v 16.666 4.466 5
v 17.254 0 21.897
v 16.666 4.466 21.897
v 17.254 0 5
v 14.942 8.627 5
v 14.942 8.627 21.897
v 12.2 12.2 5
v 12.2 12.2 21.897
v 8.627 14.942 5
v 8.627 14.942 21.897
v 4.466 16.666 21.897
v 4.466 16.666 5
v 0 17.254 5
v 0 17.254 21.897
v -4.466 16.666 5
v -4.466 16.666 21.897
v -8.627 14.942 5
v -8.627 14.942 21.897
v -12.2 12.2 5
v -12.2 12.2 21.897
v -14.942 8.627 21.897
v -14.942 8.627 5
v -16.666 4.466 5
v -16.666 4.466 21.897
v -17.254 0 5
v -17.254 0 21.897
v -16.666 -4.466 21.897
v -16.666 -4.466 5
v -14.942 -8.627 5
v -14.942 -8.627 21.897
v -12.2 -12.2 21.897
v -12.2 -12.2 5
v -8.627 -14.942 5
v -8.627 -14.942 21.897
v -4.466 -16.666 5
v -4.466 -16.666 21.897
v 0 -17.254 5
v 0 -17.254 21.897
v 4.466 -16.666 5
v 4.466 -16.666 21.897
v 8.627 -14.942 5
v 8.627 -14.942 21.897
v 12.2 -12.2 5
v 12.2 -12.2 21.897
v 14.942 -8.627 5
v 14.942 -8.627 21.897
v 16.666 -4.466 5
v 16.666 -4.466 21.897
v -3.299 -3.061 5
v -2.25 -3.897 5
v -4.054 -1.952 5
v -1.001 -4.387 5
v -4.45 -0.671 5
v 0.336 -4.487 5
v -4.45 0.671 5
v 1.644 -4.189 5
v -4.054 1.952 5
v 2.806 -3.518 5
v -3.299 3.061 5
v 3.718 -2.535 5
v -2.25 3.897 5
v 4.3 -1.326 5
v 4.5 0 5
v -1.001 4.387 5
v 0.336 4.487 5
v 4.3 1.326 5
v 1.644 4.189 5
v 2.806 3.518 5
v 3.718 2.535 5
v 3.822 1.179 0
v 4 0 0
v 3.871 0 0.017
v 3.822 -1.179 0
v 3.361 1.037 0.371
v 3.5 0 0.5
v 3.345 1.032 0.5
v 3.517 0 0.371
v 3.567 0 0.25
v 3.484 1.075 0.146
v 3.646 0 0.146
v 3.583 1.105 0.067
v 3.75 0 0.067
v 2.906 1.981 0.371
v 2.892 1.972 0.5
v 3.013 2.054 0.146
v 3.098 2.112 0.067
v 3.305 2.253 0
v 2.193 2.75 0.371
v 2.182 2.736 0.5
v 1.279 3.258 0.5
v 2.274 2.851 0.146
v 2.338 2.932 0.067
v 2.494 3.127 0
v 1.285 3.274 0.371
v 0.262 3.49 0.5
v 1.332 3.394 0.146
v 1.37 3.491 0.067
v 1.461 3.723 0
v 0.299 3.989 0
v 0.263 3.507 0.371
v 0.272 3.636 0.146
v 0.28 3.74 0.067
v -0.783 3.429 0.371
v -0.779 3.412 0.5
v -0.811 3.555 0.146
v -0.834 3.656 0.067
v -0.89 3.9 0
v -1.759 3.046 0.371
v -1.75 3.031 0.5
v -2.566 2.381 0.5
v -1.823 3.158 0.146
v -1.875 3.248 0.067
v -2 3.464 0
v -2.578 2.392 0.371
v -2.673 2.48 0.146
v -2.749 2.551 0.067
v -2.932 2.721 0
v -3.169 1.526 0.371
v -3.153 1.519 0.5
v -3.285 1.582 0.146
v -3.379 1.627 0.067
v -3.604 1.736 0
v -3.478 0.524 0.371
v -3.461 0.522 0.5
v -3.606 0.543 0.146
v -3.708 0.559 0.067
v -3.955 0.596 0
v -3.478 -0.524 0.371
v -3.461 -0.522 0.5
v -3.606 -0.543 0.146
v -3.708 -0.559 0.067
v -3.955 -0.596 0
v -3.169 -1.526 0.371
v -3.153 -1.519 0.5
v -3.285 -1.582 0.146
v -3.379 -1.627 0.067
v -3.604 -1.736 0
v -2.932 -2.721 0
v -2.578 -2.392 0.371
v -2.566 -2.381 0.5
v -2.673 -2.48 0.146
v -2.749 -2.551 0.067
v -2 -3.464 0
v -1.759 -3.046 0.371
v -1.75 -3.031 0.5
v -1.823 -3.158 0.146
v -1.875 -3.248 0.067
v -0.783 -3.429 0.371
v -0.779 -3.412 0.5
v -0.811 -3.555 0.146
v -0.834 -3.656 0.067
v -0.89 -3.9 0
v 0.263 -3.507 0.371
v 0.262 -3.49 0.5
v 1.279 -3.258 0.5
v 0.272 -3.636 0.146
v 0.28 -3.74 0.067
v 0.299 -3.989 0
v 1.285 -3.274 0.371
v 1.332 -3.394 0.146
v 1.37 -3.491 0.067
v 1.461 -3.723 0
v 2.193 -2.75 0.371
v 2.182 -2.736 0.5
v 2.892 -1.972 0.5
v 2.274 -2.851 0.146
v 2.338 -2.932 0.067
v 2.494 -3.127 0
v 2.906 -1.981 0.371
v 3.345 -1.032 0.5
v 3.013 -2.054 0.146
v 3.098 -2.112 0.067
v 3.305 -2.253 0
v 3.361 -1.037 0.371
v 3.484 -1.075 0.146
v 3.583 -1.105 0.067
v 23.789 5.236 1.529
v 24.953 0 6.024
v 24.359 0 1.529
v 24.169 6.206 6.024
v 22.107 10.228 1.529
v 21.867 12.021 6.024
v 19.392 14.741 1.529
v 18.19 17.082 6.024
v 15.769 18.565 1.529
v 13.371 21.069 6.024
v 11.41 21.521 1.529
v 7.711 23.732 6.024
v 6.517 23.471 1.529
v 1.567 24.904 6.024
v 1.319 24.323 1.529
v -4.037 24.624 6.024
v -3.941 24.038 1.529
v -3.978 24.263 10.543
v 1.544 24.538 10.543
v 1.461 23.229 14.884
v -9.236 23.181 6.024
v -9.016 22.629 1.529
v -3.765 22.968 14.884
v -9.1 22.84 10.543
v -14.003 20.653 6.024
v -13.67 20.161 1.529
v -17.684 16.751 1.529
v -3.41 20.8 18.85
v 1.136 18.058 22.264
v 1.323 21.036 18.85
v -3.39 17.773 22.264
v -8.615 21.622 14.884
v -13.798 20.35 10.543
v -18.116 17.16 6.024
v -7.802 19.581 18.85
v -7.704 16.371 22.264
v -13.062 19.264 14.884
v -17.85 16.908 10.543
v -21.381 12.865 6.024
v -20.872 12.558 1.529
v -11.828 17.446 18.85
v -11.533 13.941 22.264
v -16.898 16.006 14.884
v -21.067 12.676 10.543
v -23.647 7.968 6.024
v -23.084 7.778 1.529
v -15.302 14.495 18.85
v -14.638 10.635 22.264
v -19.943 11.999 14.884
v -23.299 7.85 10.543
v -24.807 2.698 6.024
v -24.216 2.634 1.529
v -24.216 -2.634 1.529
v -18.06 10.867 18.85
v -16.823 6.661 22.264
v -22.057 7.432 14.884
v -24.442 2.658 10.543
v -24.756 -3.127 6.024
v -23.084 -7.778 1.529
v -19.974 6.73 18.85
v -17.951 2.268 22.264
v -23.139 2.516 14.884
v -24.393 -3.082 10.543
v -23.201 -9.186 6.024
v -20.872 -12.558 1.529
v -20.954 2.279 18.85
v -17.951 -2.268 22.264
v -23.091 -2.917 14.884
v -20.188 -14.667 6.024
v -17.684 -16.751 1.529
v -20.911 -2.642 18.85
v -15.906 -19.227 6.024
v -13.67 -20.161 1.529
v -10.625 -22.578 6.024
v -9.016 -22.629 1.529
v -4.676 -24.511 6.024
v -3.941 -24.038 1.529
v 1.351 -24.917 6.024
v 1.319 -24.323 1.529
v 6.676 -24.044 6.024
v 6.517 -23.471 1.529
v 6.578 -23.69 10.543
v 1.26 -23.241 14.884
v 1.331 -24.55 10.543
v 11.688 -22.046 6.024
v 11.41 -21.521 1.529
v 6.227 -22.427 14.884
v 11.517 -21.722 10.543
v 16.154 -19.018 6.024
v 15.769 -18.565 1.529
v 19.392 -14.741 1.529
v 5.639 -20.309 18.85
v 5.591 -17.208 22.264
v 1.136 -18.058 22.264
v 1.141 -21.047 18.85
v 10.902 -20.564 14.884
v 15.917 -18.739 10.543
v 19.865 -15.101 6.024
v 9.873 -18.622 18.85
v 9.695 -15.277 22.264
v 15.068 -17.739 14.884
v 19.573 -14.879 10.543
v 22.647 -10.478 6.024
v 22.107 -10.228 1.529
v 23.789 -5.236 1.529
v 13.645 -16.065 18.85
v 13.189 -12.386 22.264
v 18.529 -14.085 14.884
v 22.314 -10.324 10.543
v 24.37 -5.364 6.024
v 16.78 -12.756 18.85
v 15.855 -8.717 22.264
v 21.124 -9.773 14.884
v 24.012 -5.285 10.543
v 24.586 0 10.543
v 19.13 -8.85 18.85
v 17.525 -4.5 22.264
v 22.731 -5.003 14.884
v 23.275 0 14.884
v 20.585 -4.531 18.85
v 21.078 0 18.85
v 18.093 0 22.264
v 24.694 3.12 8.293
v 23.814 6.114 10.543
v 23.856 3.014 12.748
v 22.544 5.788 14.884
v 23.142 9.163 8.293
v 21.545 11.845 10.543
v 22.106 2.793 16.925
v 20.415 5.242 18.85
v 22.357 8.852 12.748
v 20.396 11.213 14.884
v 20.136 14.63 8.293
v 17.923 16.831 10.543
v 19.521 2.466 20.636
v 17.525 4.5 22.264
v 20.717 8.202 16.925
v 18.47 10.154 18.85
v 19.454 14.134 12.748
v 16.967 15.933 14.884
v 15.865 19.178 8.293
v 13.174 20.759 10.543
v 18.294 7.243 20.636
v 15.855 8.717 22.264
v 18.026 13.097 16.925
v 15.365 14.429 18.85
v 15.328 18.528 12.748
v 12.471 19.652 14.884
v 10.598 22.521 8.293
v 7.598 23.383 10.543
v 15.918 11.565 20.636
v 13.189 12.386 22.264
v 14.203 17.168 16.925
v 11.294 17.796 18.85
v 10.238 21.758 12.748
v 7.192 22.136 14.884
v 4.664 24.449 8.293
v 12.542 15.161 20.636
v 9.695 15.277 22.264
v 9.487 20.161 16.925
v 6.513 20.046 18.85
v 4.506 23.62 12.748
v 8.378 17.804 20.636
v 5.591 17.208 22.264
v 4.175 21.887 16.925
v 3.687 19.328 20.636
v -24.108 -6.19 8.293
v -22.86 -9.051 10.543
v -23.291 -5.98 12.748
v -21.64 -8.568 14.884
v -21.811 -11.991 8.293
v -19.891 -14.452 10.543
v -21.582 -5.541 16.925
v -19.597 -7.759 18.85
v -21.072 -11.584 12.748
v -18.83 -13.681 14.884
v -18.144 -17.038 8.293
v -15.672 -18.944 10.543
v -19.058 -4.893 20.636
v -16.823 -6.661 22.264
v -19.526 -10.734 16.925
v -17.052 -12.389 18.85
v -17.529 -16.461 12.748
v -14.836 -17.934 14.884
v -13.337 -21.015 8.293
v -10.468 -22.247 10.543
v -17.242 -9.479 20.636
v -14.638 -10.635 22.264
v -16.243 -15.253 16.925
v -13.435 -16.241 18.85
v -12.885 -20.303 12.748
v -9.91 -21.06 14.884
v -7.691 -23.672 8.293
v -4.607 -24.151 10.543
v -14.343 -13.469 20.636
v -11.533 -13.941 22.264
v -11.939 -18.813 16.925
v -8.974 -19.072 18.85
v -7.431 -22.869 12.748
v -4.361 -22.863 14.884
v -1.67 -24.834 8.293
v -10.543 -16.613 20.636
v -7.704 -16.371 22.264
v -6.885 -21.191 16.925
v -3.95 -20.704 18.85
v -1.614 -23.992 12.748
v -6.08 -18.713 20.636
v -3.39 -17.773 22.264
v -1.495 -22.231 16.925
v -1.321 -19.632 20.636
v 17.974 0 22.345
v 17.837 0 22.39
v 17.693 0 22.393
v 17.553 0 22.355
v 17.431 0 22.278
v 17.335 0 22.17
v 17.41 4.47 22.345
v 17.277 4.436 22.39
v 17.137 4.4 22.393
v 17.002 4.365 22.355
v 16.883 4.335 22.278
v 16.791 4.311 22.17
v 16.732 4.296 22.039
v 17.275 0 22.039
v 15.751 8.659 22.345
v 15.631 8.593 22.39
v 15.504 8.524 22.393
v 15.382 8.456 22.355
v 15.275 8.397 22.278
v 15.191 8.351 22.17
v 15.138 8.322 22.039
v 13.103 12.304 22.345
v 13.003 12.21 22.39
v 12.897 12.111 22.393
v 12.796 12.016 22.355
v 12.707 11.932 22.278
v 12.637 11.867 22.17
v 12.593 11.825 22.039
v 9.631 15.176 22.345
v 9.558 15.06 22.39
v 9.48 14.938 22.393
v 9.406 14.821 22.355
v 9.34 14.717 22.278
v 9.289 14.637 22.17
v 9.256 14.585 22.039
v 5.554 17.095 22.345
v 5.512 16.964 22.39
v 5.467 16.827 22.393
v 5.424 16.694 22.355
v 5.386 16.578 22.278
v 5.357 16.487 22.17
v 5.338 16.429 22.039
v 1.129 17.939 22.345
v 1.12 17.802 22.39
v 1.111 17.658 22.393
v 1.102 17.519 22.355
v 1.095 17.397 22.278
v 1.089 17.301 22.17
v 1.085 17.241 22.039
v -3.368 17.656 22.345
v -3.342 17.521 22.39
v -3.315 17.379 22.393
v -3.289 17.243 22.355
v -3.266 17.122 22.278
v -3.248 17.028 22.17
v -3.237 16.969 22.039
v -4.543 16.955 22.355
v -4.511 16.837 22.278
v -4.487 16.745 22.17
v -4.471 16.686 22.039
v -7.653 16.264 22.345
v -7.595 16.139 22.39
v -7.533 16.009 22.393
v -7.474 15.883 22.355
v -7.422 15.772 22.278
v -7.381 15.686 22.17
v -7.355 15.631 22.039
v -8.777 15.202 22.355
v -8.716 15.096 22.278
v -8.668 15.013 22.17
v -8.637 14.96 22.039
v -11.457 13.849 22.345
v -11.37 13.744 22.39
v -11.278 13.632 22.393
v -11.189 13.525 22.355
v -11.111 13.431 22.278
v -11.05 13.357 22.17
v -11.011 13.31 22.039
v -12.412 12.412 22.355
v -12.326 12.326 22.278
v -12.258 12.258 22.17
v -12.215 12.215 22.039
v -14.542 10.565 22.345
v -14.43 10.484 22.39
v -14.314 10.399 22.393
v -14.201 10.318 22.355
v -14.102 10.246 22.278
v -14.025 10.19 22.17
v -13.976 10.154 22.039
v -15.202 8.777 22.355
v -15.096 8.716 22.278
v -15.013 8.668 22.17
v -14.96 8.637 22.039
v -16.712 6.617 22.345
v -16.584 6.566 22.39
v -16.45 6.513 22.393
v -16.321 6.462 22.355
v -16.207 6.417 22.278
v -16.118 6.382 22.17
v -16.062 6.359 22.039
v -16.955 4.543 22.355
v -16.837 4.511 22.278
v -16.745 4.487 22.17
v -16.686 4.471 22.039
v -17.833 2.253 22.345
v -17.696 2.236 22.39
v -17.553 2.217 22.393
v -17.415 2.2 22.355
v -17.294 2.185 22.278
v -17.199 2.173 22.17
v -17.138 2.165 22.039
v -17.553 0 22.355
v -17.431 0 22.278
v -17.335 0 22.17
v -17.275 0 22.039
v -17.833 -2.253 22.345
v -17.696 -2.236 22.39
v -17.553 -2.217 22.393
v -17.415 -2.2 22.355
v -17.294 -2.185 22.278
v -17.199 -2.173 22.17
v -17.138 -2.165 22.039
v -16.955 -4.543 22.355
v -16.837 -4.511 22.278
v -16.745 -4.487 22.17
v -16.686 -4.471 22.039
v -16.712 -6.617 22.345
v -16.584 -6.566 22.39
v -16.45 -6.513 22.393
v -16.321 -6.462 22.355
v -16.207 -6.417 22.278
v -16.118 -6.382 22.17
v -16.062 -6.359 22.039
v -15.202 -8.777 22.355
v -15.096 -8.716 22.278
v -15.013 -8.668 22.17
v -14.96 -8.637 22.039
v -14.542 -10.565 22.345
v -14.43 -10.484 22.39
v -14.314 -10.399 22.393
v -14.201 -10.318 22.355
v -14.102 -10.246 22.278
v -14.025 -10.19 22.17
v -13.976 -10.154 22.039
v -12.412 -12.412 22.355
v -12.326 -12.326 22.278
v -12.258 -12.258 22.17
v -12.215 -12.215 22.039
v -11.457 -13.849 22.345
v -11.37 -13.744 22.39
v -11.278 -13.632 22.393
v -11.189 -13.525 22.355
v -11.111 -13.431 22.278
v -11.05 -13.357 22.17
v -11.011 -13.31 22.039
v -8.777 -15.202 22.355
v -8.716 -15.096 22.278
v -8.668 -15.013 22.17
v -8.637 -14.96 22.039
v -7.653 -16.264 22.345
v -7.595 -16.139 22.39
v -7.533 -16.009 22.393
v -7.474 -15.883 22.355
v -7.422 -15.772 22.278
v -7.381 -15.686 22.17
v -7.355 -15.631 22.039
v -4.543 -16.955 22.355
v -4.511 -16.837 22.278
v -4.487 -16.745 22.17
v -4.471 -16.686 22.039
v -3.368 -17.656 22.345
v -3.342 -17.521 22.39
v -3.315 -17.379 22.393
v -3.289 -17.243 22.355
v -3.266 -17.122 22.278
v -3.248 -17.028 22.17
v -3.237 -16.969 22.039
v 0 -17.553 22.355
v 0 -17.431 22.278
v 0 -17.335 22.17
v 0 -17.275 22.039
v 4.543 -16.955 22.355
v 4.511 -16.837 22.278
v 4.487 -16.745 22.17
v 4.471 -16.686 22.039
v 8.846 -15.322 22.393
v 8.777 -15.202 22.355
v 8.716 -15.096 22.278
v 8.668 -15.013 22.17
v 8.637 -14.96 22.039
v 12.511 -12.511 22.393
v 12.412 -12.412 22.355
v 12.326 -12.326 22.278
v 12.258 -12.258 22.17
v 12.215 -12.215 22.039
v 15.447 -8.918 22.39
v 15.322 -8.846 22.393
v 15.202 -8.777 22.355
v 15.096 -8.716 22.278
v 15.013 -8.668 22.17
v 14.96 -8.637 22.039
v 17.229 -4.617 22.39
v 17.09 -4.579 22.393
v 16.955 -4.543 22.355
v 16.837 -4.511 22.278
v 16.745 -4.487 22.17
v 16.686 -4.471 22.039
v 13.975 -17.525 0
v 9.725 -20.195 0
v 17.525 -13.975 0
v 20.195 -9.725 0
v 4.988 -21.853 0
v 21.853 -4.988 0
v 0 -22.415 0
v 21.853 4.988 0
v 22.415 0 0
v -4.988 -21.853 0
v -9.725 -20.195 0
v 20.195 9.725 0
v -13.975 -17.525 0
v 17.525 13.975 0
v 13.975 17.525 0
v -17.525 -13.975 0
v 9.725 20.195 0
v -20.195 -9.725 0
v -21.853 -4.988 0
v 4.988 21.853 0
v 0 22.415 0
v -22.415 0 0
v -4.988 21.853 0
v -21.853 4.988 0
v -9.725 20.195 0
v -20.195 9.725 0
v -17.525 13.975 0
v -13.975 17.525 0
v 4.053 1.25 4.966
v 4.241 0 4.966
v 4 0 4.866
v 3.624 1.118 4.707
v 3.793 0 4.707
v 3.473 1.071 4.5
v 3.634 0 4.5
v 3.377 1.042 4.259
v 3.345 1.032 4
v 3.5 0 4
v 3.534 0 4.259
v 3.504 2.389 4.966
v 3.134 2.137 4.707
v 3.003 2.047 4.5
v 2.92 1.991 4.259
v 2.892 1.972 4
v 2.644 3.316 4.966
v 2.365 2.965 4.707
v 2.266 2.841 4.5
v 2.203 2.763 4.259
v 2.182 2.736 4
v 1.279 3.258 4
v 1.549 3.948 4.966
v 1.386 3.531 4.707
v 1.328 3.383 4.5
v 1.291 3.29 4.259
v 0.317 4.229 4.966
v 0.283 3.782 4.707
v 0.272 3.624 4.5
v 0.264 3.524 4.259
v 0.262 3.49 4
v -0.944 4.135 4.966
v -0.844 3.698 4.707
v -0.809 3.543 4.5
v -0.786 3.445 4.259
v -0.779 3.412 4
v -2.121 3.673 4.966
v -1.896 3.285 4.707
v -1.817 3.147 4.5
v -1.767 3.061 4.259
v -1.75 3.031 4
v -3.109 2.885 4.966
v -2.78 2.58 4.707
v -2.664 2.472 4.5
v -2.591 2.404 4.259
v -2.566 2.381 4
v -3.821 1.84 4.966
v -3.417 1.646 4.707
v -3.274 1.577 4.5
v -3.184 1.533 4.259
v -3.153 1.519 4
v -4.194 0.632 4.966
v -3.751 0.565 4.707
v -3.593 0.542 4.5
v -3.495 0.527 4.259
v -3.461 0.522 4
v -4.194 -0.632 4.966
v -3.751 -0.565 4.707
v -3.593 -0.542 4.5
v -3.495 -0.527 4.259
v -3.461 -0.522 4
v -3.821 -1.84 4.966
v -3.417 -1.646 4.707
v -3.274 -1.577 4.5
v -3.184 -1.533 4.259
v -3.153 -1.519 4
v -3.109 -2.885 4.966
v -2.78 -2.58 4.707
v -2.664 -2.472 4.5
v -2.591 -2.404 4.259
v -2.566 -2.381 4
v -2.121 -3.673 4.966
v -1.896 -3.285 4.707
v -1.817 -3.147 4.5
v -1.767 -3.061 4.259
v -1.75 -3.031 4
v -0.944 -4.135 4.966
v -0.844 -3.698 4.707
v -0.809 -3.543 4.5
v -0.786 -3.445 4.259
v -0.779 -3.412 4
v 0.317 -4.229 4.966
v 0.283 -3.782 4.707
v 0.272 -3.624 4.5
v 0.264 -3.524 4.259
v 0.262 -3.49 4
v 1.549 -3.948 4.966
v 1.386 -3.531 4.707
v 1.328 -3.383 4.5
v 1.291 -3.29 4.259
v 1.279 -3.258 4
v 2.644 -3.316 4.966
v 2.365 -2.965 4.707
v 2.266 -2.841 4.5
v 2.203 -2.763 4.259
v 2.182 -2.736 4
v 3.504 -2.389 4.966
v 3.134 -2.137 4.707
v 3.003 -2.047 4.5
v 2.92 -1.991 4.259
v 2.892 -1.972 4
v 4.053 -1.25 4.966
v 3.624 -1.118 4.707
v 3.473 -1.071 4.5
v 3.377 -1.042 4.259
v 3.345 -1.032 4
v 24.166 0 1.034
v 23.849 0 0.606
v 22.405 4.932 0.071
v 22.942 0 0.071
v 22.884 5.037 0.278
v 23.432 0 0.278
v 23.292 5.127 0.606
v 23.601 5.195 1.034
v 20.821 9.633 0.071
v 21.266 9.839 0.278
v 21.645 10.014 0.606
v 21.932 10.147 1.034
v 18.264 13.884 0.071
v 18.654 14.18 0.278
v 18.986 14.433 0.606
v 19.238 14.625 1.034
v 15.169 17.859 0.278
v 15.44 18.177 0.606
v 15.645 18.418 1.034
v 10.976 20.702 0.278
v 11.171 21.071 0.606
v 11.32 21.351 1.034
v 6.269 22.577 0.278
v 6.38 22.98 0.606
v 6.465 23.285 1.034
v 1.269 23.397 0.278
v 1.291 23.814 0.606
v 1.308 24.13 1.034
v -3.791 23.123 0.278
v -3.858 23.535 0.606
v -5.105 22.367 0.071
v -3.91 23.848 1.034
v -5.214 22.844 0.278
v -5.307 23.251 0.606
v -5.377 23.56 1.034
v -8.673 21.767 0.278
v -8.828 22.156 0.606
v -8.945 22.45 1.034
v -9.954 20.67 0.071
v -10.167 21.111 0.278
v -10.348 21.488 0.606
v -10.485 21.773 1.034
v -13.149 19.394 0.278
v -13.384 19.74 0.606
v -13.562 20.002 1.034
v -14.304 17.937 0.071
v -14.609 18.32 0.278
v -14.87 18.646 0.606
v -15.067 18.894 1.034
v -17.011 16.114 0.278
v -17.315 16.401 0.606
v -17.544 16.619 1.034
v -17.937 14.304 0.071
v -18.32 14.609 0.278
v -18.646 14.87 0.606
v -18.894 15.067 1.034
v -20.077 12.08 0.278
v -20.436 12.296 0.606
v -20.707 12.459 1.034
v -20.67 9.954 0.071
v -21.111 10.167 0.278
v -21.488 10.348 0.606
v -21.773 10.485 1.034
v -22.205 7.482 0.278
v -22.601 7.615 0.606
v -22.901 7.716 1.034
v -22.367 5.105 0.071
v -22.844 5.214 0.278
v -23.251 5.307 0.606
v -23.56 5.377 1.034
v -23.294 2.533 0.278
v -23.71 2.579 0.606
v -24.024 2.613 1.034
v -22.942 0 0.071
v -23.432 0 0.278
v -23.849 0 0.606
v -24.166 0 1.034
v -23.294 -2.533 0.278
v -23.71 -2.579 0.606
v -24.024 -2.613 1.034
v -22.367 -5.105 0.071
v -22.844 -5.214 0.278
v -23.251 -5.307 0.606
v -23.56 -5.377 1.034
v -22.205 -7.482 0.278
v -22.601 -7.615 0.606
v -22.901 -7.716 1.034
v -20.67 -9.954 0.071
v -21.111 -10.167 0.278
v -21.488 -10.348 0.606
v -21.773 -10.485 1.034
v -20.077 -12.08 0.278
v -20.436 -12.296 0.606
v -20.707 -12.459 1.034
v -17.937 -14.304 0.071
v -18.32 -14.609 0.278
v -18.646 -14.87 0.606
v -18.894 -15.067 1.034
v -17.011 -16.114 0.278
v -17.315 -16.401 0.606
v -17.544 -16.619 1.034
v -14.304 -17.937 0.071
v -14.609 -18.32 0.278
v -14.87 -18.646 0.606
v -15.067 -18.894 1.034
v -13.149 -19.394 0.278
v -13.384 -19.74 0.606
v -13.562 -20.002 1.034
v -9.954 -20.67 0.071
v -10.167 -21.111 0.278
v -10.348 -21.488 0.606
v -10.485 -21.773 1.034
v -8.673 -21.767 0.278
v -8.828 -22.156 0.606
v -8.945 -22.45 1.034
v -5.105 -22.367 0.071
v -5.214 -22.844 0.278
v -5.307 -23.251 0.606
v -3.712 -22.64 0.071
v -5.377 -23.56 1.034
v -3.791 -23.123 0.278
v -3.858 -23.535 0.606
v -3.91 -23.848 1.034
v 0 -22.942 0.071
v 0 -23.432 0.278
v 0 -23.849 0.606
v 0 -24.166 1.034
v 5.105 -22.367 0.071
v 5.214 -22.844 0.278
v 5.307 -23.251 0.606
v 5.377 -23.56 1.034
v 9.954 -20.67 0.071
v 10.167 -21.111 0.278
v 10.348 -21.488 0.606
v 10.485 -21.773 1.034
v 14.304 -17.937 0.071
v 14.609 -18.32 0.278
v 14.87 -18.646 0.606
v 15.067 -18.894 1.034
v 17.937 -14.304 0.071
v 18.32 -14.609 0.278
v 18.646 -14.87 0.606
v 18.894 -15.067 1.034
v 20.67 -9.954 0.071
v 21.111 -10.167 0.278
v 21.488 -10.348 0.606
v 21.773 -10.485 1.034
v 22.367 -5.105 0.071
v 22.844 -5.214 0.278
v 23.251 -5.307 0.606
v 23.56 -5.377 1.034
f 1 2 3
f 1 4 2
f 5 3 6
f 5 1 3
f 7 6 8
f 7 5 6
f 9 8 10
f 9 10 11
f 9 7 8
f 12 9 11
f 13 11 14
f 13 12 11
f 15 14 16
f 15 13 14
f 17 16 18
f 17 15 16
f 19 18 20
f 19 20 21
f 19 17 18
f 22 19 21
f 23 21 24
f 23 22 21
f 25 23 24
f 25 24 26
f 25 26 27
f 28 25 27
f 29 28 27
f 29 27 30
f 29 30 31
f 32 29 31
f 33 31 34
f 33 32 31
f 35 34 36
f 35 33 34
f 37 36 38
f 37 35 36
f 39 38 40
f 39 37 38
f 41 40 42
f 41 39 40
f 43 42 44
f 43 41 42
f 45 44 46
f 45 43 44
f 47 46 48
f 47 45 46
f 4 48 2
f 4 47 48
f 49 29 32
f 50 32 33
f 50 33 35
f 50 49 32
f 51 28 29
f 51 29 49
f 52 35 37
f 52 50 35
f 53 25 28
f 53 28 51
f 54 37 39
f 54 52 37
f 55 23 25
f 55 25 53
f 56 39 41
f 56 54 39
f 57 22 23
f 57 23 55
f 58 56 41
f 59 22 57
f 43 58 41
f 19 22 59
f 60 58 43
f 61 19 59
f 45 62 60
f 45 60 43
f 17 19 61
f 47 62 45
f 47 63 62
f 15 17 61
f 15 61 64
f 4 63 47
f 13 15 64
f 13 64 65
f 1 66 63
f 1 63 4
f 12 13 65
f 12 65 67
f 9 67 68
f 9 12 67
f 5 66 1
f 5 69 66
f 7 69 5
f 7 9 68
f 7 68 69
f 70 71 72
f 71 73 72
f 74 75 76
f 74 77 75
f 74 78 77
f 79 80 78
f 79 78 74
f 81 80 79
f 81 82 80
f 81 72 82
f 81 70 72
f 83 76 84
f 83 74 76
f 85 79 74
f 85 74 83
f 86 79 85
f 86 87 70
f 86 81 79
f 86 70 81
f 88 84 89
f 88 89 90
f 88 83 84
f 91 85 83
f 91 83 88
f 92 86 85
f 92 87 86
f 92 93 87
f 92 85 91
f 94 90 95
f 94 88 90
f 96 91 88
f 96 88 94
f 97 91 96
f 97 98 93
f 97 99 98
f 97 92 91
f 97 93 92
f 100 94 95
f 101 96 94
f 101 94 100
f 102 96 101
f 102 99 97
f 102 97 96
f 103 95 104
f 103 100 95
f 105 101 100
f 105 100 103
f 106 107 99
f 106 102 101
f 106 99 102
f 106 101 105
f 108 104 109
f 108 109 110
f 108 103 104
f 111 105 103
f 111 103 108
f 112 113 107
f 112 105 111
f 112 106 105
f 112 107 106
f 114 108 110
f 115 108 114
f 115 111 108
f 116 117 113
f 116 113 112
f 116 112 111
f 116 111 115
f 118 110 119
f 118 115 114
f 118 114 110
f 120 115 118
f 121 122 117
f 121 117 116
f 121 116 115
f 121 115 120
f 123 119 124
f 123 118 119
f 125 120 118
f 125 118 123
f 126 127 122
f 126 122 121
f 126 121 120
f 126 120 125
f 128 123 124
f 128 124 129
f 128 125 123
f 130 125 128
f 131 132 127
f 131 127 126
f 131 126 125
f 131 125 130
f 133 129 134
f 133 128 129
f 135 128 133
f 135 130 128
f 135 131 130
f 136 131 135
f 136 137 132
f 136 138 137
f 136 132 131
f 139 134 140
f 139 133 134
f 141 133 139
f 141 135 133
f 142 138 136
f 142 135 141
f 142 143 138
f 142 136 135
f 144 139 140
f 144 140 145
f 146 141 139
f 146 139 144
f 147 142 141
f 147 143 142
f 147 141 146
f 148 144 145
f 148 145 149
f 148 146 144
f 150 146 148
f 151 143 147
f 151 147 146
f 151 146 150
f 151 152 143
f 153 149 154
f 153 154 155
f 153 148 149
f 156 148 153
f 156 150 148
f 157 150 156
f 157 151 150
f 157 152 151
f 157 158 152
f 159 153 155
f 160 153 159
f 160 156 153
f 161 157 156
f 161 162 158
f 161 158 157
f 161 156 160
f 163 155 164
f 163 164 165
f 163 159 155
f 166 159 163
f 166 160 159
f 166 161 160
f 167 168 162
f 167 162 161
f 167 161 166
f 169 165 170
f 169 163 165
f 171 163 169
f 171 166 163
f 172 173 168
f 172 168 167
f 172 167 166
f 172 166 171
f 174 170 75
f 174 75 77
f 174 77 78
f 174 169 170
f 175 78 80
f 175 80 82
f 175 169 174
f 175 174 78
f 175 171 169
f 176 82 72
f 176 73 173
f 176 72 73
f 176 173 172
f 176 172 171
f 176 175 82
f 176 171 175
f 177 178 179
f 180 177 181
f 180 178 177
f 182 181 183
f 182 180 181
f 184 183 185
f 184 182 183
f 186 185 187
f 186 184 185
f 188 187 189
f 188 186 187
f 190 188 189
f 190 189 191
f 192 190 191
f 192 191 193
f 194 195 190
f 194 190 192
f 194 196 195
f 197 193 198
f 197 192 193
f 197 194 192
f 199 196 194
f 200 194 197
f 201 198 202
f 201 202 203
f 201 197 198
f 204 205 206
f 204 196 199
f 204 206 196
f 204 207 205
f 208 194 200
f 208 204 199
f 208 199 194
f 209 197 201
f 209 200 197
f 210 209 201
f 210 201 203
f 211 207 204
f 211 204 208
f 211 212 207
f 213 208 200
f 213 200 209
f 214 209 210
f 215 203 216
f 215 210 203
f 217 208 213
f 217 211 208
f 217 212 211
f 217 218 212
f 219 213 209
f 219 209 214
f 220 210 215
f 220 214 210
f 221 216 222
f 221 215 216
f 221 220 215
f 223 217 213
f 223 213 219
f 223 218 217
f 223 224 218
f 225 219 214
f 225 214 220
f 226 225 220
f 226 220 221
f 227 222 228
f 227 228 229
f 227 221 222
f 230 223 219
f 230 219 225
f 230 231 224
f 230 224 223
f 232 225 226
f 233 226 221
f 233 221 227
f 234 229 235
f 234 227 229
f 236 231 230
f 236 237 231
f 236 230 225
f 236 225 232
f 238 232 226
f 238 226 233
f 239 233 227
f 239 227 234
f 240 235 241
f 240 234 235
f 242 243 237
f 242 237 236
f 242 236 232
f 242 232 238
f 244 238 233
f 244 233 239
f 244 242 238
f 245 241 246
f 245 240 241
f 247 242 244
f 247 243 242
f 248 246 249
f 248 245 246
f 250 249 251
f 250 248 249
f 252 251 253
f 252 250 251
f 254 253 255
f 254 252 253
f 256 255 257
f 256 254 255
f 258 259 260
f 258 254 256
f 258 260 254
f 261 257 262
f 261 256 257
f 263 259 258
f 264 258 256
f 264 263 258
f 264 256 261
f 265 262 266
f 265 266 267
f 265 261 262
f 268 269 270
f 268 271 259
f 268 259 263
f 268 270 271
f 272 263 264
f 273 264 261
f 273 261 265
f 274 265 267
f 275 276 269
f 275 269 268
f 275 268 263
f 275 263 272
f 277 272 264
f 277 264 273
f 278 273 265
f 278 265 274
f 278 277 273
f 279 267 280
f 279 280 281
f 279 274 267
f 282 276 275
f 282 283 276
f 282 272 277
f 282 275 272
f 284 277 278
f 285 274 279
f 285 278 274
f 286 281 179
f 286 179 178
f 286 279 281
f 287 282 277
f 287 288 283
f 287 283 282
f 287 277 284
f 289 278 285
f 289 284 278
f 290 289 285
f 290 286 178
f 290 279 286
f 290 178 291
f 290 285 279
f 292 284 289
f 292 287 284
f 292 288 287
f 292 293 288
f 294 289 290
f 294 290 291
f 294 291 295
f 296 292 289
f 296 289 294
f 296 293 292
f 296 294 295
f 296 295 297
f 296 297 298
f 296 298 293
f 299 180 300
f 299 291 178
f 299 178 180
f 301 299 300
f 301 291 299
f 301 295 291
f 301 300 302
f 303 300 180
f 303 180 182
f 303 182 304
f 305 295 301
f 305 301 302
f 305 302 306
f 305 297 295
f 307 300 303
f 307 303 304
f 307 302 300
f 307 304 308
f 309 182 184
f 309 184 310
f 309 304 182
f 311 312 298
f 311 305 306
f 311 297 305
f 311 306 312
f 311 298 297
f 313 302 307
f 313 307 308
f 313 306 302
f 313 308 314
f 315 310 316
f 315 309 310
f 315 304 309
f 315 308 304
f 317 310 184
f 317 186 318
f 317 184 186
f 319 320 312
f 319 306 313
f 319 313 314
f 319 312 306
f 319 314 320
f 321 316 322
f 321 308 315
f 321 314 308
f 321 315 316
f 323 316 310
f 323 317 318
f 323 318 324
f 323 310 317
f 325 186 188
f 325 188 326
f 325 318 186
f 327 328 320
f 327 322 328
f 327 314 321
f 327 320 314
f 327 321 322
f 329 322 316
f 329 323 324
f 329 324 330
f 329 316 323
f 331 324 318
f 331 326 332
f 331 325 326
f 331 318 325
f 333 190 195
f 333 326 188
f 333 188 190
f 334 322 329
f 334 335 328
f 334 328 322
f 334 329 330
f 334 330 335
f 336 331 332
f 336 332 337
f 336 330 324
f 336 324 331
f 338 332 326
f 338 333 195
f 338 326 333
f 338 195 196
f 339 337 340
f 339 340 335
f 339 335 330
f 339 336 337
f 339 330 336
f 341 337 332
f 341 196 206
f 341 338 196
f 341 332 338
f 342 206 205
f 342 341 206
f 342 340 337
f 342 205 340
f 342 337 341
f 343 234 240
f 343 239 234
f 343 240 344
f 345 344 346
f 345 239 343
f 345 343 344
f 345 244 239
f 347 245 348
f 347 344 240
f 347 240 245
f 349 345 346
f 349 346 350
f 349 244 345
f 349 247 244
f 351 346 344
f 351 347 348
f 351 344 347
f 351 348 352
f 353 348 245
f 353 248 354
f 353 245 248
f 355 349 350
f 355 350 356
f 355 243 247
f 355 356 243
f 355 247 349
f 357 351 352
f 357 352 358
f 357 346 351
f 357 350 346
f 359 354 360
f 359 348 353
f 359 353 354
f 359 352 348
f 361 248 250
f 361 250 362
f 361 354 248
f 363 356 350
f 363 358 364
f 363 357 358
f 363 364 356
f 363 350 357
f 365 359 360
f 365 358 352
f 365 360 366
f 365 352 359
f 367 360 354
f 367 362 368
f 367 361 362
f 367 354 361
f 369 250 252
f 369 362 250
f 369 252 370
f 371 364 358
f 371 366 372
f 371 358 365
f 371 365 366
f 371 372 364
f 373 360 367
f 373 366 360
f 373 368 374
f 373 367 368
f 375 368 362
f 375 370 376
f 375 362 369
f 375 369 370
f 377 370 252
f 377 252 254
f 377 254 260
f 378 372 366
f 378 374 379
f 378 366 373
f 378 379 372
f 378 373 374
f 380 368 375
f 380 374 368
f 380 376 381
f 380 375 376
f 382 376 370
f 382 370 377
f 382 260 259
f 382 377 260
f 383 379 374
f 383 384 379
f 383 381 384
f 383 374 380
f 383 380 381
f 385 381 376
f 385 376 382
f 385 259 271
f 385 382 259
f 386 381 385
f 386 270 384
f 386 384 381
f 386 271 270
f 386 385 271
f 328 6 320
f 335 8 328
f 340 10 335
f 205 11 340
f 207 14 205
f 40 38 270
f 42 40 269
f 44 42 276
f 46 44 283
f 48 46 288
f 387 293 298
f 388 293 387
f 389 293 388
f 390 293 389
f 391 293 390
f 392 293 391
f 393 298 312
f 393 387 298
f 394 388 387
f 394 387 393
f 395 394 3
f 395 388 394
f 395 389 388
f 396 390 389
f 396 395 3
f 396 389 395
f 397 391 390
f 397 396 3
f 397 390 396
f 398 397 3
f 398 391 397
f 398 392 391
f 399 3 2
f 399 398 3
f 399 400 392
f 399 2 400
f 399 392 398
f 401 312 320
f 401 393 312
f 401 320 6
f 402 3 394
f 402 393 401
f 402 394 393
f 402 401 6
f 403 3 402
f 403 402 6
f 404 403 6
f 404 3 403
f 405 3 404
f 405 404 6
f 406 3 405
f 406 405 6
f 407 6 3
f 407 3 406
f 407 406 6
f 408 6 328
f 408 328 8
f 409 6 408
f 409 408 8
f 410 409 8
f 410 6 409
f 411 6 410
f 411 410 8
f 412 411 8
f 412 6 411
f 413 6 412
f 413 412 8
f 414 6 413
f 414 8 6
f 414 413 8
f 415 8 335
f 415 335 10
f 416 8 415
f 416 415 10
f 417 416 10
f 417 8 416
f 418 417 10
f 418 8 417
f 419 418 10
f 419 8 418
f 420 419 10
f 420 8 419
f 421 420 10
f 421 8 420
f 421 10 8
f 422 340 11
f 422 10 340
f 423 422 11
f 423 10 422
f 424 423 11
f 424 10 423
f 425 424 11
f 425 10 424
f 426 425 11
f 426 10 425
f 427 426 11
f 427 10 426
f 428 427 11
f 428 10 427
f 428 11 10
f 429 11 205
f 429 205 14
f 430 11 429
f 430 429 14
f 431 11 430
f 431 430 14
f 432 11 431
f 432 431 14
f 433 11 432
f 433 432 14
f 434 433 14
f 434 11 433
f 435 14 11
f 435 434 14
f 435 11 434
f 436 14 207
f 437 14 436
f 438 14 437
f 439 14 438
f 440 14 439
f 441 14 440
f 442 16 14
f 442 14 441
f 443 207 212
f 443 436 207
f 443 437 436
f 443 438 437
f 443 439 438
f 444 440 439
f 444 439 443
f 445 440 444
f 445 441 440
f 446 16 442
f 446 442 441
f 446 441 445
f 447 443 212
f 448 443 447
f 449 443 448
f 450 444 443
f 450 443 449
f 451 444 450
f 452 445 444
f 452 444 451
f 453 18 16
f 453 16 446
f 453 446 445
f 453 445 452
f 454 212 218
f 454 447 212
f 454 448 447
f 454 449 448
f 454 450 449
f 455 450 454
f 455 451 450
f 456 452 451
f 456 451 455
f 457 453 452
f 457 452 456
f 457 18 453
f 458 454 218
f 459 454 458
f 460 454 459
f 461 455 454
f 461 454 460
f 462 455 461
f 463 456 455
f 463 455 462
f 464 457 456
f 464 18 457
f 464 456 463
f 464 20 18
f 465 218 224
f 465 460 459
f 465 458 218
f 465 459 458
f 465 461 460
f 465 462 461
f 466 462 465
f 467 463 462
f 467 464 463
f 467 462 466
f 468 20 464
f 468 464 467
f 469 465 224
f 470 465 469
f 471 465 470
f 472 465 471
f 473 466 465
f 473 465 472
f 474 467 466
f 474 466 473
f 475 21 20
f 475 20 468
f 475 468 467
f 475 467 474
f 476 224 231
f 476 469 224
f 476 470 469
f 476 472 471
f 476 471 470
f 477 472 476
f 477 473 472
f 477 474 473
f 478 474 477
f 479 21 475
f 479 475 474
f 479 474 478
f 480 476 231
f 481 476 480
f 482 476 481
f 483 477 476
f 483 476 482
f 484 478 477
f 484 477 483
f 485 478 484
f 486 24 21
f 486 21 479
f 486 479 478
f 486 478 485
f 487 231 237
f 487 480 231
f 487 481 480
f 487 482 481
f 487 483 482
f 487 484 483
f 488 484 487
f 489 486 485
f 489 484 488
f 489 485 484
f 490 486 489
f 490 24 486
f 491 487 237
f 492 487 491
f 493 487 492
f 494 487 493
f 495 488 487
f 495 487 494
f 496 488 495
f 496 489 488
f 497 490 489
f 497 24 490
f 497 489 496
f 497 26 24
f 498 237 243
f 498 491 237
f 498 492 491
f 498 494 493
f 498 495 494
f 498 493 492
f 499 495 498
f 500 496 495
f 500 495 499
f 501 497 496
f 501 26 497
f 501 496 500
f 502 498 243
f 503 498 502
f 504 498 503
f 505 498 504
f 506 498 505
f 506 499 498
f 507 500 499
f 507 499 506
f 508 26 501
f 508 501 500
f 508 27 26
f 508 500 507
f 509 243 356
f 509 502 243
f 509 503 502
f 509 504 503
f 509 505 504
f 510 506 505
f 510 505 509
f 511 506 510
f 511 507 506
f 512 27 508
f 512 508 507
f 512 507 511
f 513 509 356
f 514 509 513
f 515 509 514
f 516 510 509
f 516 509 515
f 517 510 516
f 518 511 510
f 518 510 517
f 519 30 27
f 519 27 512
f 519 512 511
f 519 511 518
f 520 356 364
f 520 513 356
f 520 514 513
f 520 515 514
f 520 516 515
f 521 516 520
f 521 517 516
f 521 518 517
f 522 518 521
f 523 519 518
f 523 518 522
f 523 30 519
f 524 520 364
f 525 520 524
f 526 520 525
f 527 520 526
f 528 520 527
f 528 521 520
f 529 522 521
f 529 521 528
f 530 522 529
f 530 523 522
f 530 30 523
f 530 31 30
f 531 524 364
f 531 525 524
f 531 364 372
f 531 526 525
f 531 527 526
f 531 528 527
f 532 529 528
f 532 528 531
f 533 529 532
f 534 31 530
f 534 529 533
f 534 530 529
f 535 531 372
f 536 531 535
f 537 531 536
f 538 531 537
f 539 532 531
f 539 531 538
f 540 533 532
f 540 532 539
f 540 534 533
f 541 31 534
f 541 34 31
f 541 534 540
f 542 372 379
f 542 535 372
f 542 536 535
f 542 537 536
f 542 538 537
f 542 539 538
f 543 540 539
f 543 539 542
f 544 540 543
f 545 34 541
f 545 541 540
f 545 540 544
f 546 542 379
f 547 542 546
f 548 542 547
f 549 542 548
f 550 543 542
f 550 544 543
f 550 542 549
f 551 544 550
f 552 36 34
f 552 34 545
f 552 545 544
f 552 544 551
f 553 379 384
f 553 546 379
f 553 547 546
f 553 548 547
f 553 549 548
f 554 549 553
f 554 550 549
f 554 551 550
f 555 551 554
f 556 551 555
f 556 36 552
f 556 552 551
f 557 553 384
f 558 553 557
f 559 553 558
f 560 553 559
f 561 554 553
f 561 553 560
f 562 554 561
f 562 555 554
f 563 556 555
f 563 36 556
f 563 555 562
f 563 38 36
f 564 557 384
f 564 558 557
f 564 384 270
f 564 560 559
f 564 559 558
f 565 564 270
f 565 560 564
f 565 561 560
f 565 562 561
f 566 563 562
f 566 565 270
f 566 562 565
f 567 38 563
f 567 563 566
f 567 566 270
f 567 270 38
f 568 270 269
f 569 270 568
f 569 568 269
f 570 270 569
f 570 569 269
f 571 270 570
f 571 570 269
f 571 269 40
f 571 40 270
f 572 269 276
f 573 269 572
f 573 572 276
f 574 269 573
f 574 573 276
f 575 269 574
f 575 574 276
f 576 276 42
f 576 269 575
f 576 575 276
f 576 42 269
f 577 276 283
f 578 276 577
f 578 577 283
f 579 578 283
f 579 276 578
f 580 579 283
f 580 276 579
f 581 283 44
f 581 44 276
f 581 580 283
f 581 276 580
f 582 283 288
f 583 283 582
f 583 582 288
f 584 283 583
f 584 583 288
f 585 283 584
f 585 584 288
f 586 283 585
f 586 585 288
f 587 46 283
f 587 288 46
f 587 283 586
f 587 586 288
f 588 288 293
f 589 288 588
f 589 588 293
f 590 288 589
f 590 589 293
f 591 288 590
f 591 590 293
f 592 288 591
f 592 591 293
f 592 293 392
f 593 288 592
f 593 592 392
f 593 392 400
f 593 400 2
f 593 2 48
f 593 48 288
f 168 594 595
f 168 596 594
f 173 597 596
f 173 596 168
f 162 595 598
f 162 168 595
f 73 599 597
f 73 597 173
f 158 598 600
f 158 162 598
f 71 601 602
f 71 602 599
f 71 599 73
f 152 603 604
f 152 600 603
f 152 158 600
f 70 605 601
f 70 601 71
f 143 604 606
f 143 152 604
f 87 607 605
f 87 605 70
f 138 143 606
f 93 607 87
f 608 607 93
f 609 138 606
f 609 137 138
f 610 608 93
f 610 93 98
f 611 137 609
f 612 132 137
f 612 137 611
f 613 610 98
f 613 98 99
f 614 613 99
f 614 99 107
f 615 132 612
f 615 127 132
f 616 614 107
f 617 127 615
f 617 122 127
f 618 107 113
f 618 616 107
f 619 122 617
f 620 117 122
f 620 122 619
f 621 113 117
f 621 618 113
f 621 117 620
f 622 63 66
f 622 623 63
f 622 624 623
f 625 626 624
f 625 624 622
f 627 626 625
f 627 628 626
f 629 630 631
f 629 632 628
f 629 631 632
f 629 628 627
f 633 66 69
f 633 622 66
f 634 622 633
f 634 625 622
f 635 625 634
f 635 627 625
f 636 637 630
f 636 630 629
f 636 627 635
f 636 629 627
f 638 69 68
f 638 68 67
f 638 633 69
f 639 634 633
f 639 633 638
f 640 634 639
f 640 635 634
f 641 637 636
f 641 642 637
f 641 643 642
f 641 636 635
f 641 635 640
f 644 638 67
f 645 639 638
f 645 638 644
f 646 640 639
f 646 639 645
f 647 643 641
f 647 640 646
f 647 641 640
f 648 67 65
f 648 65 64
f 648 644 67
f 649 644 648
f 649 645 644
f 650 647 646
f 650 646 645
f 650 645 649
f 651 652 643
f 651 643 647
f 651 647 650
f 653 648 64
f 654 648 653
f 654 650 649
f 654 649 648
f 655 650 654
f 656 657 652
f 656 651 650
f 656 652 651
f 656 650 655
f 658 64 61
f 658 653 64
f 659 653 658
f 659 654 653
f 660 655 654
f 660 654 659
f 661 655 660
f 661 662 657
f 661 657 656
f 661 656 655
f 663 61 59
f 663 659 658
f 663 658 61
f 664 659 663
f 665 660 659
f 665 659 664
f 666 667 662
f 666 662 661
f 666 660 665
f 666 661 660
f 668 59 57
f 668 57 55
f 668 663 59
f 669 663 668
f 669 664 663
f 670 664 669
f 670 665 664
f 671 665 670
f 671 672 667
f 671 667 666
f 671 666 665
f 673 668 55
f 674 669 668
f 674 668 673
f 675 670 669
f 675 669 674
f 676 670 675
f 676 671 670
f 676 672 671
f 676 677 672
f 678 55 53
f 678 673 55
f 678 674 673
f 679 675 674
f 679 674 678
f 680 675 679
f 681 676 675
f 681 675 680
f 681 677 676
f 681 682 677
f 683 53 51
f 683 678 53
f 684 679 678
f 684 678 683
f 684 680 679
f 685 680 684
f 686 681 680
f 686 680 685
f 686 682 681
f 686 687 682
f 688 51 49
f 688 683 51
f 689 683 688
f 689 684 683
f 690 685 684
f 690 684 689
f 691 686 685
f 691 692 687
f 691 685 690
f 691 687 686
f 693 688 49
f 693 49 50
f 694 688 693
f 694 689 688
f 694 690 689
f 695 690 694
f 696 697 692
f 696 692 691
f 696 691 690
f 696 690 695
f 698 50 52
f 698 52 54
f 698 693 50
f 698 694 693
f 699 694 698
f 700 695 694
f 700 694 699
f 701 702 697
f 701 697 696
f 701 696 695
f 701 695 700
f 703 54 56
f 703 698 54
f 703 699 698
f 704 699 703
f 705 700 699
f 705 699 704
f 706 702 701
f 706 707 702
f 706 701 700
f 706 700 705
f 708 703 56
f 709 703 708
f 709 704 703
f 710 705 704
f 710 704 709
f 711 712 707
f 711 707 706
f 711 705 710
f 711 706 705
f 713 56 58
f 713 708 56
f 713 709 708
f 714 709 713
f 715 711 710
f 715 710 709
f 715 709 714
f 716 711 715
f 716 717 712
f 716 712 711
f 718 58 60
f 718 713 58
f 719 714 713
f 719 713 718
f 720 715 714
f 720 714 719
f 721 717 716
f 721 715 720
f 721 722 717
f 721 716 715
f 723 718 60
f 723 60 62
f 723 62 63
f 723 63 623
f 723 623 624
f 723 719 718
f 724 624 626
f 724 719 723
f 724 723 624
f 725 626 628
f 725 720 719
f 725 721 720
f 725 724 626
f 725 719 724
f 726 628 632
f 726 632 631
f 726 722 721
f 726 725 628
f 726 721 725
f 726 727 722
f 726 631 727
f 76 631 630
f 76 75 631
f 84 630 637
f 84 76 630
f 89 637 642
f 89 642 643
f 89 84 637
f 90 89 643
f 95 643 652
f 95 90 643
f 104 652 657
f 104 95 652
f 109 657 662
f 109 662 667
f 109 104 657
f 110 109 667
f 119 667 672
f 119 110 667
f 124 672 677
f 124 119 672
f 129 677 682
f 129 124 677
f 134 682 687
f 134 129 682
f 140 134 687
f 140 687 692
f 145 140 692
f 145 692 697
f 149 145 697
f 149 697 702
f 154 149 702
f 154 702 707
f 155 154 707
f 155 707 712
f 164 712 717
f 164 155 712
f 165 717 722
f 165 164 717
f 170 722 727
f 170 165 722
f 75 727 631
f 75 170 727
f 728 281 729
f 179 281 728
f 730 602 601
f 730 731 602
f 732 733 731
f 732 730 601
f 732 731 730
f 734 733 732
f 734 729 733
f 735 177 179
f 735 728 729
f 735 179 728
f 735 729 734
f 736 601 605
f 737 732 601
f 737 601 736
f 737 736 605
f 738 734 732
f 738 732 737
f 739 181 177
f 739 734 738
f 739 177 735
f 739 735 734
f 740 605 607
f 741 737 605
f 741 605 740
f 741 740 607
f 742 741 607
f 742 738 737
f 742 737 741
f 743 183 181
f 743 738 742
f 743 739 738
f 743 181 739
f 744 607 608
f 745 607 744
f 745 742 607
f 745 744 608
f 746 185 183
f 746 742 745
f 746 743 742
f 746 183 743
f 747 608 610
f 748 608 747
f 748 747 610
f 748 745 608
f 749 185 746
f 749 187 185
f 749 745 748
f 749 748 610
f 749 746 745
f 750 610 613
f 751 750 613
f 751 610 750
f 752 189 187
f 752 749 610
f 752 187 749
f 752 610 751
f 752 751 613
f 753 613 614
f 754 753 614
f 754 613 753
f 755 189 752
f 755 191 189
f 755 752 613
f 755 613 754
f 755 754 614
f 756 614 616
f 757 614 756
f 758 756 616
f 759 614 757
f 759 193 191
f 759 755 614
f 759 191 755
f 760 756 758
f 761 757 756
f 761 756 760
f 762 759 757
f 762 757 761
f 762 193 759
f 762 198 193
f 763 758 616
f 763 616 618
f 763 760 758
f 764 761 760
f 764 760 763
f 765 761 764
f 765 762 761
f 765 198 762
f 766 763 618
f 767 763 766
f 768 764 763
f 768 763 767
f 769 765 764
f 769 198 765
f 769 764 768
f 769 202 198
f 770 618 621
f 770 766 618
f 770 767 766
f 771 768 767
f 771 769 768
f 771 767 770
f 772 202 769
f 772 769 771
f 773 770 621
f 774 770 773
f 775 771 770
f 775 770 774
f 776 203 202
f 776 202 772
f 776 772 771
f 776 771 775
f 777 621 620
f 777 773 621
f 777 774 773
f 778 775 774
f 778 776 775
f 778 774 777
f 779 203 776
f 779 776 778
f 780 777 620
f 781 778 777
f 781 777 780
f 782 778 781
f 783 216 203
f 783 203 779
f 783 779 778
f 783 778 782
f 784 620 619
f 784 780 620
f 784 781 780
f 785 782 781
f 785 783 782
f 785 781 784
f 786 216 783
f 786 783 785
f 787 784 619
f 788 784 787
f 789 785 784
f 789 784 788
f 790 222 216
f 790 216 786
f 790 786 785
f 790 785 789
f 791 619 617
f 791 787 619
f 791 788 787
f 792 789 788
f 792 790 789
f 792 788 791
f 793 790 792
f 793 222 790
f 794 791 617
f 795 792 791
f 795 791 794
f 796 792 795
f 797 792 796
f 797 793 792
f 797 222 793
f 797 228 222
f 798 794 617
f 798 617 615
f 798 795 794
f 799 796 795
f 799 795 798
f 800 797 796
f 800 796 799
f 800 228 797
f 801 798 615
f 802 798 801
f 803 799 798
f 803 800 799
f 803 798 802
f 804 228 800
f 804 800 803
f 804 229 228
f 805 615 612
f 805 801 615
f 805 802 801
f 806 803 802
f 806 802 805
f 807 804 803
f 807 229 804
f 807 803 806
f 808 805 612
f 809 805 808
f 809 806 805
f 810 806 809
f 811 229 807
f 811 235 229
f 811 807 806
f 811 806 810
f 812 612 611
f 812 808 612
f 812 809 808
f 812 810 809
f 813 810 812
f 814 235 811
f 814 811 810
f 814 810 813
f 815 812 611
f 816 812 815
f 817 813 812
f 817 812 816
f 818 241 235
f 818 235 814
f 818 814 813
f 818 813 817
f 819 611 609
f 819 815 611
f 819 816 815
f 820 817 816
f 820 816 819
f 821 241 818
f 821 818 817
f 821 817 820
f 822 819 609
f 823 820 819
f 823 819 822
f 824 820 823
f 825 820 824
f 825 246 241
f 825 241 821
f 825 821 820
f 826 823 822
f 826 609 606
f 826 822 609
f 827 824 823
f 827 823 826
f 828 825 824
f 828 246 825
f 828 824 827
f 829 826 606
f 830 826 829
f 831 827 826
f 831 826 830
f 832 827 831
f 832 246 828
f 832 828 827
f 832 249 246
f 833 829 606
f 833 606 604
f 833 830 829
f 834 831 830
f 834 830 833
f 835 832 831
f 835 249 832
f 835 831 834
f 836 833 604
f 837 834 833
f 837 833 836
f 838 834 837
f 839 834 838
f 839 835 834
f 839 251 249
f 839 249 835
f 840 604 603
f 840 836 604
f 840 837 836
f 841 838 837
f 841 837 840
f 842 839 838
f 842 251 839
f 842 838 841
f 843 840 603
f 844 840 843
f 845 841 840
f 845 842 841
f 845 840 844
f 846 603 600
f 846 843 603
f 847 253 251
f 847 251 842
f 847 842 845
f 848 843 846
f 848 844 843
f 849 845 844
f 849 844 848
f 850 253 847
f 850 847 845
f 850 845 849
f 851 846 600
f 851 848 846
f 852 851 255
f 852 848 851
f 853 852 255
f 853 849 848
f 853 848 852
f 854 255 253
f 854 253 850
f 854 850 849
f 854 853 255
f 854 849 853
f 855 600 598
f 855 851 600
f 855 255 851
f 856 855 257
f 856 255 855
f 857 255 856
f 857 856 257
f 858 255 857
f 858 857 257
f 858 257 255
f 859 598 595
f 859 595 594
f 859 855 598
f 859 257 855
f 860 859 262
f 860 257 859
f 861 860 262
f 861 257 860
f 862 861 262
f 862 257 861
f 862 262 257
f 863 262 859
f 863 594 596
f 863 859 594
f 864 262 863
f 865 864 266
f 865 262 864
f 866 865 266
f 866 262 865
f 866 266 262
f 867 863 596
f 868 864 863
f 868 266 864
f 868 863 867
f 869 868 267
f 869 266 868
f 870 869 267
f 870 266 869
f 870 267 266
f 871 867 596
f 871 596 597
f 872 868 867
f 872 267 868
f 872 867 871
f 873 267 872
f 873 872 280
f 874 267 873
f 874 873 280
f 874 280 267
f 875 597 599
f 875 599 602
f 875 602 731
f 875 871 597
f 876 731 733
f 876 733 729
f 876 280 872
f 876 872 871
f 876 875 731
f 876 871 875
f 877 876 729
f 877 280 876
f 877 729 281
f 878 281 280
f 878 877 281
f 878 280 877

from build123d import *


with BuildPart() as f1:
    # F0 (on Front) → F1 (revolve)
    with BuildSketch(Plane.XZ):
        with BuildLine():
            ThreePointArc((3.5, 0.5), (3.646447, 0.146447), (4, 0))
            Line((4, 0), (22.414915, 0))
            ThreePointArc((22.414915, 0), (23.651436, 0.428053), (24.35866, 1.528984))
            ThreePointArc((24.35866, 1.528984), (24.046093, 12.748498), (18.093276, 22.263704))
            ThreePointArc((18.093276, 22.263704), (17.553496, 22.354653), (17.253862, 21.896555))
            Line((17.253862, 21.896555), (17.253862, 5))
            Line((17.253862, 5), (4.5, 5))
            ThreePointArc((4.5, 5), (3.792893, 4.707107), (3.5, 4))
            Line((3.5, 4), (3.5, 0.5))
        make_face()
    revolve(axis=Axis((0, 0, 11.5), (0, 0, 1)))


solid = f1.part
